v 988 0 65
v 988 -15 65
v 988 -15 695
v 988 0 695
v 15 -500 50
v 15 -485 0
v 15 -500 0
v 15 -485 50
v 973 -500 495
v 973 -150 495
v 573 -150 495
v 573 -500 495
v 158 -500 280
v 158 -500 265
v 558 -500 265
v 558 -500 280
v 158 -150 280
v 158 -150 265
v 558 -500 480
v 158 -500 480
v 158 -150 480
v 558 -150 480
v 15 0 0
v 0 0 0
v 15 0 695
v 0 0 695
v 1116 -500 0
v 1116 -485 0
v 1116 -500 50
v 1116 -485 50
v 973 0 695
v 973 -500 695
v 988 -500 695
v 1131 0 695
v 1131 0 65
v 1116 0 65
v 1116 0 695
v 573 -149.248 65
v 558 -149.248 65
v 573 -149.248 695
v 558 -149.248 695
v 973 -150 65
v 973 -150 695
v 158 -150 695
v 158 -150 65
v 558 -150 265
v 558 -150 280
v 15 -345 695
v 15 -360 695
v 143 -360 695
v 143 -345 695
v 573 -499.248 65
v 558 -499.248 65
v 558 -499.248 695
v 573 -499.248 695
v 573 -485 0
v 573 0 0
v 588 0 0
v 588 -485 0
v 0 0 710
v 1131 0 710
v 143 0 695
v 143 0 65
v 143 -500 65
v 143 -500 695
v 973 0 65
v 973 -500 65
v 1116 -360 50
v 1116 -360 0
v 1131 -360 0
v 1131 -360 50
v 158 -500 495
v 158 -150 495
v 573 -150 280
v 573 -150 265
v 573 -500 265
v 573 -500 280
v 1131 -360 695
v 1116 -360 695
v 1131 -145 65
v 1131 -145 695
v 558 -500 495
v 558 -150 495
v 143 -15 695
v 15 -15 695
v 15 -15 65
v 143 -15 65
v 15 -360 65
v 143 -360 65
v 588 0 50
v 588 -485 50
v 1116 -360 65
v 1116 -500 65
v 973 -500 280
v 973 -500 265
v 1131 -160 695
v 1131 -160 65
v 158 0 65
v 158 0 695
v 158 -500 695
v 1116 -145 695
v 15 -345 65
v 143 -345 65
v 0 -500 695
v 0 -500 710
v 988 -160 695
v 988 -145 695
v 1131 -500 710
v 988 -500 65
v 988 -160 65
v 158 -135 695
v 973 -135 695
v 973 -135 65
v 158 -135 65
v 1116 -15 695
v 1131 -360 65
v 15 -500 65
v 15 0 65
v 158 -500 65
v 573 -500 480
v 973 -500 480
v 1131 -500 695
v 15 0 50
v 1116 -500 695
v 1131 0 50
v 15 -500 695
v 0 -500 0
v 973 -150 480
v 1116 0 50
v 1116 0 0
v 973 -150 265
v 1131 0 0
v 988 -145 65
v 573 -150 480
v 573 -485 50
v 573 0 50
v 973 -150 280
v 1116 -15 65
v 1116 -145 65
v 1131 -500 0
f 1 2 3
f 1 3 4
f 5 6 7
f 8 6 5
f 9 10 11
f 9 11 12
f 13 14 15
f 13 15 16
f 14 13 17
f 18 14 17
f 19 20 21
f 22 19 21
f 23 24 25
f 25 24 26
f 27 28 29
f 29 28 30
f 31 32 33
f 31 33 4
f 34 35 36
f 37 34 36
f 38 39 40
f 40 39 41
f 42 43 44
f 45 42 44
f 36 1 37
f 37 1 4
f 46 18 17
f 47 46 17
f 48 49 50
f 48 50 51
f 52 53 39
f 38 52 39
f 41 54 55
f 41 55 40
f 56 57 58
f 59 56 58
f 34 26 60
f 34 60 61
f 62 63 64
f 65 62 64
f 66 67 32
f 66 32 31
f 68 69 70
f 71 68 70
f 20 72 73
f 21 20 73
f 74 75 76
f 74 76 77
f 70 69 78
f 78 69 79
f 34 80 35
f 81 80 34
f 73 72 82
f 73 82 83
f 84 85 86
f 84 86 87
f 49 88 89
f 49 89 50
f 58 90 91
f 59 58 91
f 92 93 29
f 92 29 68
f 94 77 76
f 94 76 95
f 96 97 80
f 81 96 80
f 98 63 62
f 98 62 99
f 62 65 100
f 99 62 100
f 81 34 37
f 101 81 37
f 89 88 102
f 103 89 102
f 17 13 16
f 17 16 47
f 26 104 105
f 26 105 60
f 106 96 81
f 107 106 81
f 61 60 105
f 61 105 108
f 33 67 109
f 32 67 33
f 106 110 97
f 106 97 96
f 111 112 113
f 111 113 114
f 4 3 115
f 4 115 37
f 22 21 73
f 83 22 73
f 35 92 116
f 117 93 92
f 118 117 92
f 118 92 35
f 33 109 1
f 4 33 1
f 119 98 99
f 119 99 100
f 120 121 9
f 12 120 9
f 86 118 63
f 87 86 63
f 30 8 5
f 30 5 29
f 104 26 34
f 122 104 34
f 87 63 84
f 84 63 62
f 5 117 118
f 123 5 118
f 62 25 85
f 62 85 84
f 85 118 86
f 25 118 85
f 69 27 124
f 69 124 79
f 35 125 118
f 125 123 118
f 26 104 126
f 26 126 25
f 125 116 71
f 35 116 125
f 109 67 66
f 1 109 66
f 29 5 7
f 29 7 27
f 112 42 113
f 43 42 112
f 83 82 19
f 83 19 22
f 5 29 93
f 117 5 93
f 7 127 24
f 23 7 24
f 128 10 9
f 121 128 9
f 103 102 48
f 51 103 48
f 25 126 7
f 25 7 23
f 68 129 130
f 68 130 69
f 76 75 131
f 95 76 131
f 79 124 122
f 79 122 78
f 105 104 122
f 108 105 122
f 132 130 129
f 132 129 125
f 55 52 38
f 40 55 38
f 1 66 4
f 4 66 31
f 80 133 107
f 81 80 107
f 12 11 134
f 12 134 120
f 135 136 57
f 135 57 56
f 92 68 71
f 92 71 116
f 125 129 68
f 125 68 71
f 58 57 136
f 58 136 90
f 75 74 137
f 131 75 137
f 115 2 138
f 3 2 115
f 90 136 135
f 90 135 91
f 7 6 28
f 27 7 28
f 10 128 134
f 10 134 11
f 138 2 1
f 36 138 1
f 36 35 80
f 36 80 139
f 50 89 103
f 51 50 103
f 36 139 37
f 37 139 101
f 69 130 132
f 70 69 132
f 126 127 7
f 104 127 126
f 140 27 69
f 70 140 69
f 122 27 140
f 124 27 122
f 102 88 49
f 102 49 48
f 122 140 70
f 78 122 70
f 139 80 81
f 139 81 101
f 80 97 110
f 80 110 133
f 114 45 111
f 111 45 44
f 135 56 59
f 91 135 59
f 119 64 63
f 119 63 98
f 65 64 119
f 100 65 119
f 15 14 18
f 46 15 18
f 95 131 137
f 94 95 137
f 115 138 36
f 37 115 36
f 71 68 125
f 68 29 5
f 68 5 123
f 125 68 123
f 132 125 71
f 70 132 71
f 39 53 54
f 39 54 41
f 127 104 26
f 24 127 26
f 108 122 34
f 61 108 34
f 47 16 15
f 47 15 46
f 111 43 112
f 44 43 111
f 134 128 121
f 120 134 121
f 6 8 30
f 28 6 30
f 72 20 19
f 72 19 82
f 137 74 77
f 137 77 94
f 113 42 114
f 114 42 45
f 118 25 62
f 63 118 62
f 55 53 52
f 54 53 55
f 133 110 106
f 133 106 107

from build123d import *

# Parameters (mm, degrees)
F0_W      = 500
F0_H      = 695
F1_DEPTH  = 15
F2_W      = 1131
F2_H      = 500
F3_DEPTH  = 15
F4_W      = 500
F4_H      = 15
F5_DEPTH  = 1101
F6_W      = 15
F6_H      = 485
F7_DEPTH  = 50
F8_W      = 1101
F8_H      = 50
F9_DEPTH  = 15
F10_W     = 140
F10_H     = 695
F11_DEPTH = 15
F12_W     = 360
F12_H     = 15
F13_DEPTH = 15
F14_W     = 15
F14_H     = 360
F15_DEPTH = 50
F16_W     = 15
F16_H     = 500
F17_DEPTH = 630
F18_W     = 350
F18_H     = 15
F19_DEPTH = 400
F20_W     = 350
F20_H     = 15
F21_DEPTH = 400
F22_W     = 815
F22_H     = 630
F23_DEPTH = 15
F24_W     = 500
F24_H     = 630
F25_DEPTH = 15
F26_W     = 400
F26_H     = 15
F27_DEPTH = 350
F29_W     = 350
F29_H     = 15
F30_DEPTH = 400
F31_W     = 350
F31_H     = 630
F32_DEPTH = 15
F33_W     = 15
F33_H     = 630
F34_DEPTH = 143
F35_W     = 128
F35_H     = 630
F36_DEPTH = 15
F37_W     = 15
F37_H     = 630
F38_DEPTH = 128
F39_W     = 15
F39_H     = 630
F40_DEPTH = 128
F41_W     = 15
F41_H     = 630
F42_DEPTH = 145


with BuildPart() as f1:
    # F0 (on Right) → F1 (new body)
    with BuildSketch(Plane.YZ):
        with Locations((-250, 347.5)):
            Rectangle(F0_W, F0_H)
    extrude(amount=F1_DEPTH)


with BuildPart() as f3:
    # F2 (on face) → F3 (new body)
    with BuildSketch(Plane.XY.offset(695)):
        with Locations((565.5, -250)):
            Rectangle(F2_W, F2_H)
    extrude(amount=F3_DEPTH)


with BuildPart() as f5:
    # F4 (on face) → F5 (new body)
    with BuildSketch(Plane.YZ.offset(15)):
        with Locations((-250, 57.5)):
            Rectangle(F4_W, F4_H)
    extrude(amount=F5_DEPTH)

    # F12 (on face) → F13 (join)
    with BuildSketch(Plane.YZ.offset(1116)):
        with Locations((-180, 57.5)):
            Rectangle(F12_W, F12_H)
    extrude(amount=F13_DEPTH)


with BuildPart() as f7:
    # F6 (on face) → F7 (new body)
    with BuildSketch(Plane(origin=(0, 0, 50), x_dir=(1, 0, 0), z_dir=(0, 0, -1))):
        with Locations((580.5, 242.5)):
            Rectangle(F6_W, F6_H)
    extrude(amount=F7_DEPTH)


with BuildPart() as f9:
    # F8 (on face) → F9 (new body)
    with BuildSketch(Plane.XZ.offset(485)):
        with Locations((565.5, 25)):
            Rectangle(F8_W, F8_H)
    extrude(amount=F9_DEPTH)


with BuildPart() as f11:
    # F10 (on face) → F11 (new body)
    with BuildSketch(Plane.YZ.offset(1116)):
        with Locations((-430, 347.5)):
            Rectangle(F10_W, F10_H)
    extrude(amount=F11_DEPTH)


with BuildPart() as f15:
    # F14 (on face) → F15 (new body)
    with BuildSketch(Plane(origin=(0, 0, 50), x_dir=(1, 0, 0), z_dir=(0, 0, -1))):
        with Locations((1123.5, 180)):
            Rectangle(F14_W, F14_H)
    extrude(amount=F15_DEPTH)


with BuildPart() as f17:
    # F16 (on face) → F17 (new body)
    with BuildSketch(Plane(origin=(0, 0, 695), x_dir=(1, 0, 0), z_dir=(0, 0, -1))):
        with Locations((150.5, 250)):
            Rectangle(F16_W, F16_H)
    extrude(amount=F17_DEPTH)


with BuildPart() as f19:
    # F18 (on face) → F19 (new body)
    with BuildSketch(Plane.YZ.offset(158)):
        with Locations((-325, 487.5)):
            Rectangle(F18_W, F18_H)
    extrude(amount=F19_DEPTH)


with BuildPart() as f21:
    # F20 (on face) → F21 (new body)
    with BuildSketch(Plane.YZ.offset(158)):
        with Locations((-325, 272.5)):
            Rectangle(F20_W, F20_H)
    extrude(amount=F21_DEPTH)


with BuildPart() as f23:
    # F22 (on face) → F23 (new body)
    with BuildSketch(Plane(origin=(0, -150, 0), x_dir=(-1, 0, 0), z_dir=(0, 1, 0))):
        with Locations((-565.5, 380)):
            Rectangle(F22_W, F22_H)
    extrude(amount=F23_DEPTH)


with BuildPart() as f25:
    # F24 (on face) → F25 (new body)
    with BuildSketch(Plane.YZ.offset(973)):
        with Locations((-250, 380)):
            Rectangle(F24_W, F24_H)
    extrude(amount=F25_DEPTH)


with BuildPart() as f27:
    # F26 (on face) → F27 (new body)
    with BuildSketch(Plane.XZ.offset(150)):
        with Locations((773, 272.5)):
            Rectangle(F26_W, F26_H)
    extrude(amount=F27_DEPTH)


with BuildPart() as f30:
    # F29 (on face) → F30 (new body)
    with BuildSketch(Plane(origin=(973, 0, 0), x_dir=(0, -1, 0), z_dir=(-1, 0, 0))):
        with Locations((325, 487.5)):
            Rectangle(F29_W, F29_H)
    extrude(amount=F30_DEPTH)


with BuildPart() as f32:
    # F31 (on face) → F32 (new body)
    with BuildSketch(Plane.YZ.offset(558)):
        with Locations((-324.248115566, 380)):
            Rectangle(F31_W, F31_H)
    extrude(amount=F32_DEPTH)


with BuildPart() as f34:
    # F33 (on face) → F34 (new body)
    with BuildSketch(Plane.YZ.offset(988)):
        with Locations((-152.5, 380)):
            Rectangle(F33_W, F33_H)
    extrude(amount=F34_DEPTH)


with BuildPart() as f36:
    # F35 (on Front) → F36 (new body)
    with BuildSketch(Plane.XZ):
        with Locations((79, 380)):
            Rectangle(F35_W, F35_H)
    extrude(amount=F36_DEPTH)


with BuildPart() as f38:
    # F37 (on face) → F38 (new body)
    with BuildSketch(Plane.YZ.offset(15)):
        with Locations((-352.5, 380)):
            Rectangle(F37_W, F37_H)
    extrude(amount=F38_DEPTH)


with BuildPart() as f40:
    # F39 (on face) → F40 (new body)
    with BuildSketch(Plane.YZ.offset(988)):
        with Locations((-7.5, 380)):
            Rectangle(F39_W, F39_H)
    extrude(amount=F40_DEPTH)


with BuildPart() as f42:
    # F41 (on face) → F42 (new body)
    with BuildSketch(Plane(origin=(0, -145, 0), x_dir=(-1, 0, 0), z_dir=(0, 1, 0))):
        with Locations((-1123.5, 380)):
            Rectangle(F41_W, F41_H)
    extrude(amount=F42_DEPTH)


solid = Compound([f1.part, f3.part, f5.part, f7.part, f9.part, f11.part, f15.part, f17.part, f19.part, f21.part, f23.part, f25.part, f27.part, f30.part, f32.part, f34.part, f36.part, f38.part, f40.part, f42.part])
